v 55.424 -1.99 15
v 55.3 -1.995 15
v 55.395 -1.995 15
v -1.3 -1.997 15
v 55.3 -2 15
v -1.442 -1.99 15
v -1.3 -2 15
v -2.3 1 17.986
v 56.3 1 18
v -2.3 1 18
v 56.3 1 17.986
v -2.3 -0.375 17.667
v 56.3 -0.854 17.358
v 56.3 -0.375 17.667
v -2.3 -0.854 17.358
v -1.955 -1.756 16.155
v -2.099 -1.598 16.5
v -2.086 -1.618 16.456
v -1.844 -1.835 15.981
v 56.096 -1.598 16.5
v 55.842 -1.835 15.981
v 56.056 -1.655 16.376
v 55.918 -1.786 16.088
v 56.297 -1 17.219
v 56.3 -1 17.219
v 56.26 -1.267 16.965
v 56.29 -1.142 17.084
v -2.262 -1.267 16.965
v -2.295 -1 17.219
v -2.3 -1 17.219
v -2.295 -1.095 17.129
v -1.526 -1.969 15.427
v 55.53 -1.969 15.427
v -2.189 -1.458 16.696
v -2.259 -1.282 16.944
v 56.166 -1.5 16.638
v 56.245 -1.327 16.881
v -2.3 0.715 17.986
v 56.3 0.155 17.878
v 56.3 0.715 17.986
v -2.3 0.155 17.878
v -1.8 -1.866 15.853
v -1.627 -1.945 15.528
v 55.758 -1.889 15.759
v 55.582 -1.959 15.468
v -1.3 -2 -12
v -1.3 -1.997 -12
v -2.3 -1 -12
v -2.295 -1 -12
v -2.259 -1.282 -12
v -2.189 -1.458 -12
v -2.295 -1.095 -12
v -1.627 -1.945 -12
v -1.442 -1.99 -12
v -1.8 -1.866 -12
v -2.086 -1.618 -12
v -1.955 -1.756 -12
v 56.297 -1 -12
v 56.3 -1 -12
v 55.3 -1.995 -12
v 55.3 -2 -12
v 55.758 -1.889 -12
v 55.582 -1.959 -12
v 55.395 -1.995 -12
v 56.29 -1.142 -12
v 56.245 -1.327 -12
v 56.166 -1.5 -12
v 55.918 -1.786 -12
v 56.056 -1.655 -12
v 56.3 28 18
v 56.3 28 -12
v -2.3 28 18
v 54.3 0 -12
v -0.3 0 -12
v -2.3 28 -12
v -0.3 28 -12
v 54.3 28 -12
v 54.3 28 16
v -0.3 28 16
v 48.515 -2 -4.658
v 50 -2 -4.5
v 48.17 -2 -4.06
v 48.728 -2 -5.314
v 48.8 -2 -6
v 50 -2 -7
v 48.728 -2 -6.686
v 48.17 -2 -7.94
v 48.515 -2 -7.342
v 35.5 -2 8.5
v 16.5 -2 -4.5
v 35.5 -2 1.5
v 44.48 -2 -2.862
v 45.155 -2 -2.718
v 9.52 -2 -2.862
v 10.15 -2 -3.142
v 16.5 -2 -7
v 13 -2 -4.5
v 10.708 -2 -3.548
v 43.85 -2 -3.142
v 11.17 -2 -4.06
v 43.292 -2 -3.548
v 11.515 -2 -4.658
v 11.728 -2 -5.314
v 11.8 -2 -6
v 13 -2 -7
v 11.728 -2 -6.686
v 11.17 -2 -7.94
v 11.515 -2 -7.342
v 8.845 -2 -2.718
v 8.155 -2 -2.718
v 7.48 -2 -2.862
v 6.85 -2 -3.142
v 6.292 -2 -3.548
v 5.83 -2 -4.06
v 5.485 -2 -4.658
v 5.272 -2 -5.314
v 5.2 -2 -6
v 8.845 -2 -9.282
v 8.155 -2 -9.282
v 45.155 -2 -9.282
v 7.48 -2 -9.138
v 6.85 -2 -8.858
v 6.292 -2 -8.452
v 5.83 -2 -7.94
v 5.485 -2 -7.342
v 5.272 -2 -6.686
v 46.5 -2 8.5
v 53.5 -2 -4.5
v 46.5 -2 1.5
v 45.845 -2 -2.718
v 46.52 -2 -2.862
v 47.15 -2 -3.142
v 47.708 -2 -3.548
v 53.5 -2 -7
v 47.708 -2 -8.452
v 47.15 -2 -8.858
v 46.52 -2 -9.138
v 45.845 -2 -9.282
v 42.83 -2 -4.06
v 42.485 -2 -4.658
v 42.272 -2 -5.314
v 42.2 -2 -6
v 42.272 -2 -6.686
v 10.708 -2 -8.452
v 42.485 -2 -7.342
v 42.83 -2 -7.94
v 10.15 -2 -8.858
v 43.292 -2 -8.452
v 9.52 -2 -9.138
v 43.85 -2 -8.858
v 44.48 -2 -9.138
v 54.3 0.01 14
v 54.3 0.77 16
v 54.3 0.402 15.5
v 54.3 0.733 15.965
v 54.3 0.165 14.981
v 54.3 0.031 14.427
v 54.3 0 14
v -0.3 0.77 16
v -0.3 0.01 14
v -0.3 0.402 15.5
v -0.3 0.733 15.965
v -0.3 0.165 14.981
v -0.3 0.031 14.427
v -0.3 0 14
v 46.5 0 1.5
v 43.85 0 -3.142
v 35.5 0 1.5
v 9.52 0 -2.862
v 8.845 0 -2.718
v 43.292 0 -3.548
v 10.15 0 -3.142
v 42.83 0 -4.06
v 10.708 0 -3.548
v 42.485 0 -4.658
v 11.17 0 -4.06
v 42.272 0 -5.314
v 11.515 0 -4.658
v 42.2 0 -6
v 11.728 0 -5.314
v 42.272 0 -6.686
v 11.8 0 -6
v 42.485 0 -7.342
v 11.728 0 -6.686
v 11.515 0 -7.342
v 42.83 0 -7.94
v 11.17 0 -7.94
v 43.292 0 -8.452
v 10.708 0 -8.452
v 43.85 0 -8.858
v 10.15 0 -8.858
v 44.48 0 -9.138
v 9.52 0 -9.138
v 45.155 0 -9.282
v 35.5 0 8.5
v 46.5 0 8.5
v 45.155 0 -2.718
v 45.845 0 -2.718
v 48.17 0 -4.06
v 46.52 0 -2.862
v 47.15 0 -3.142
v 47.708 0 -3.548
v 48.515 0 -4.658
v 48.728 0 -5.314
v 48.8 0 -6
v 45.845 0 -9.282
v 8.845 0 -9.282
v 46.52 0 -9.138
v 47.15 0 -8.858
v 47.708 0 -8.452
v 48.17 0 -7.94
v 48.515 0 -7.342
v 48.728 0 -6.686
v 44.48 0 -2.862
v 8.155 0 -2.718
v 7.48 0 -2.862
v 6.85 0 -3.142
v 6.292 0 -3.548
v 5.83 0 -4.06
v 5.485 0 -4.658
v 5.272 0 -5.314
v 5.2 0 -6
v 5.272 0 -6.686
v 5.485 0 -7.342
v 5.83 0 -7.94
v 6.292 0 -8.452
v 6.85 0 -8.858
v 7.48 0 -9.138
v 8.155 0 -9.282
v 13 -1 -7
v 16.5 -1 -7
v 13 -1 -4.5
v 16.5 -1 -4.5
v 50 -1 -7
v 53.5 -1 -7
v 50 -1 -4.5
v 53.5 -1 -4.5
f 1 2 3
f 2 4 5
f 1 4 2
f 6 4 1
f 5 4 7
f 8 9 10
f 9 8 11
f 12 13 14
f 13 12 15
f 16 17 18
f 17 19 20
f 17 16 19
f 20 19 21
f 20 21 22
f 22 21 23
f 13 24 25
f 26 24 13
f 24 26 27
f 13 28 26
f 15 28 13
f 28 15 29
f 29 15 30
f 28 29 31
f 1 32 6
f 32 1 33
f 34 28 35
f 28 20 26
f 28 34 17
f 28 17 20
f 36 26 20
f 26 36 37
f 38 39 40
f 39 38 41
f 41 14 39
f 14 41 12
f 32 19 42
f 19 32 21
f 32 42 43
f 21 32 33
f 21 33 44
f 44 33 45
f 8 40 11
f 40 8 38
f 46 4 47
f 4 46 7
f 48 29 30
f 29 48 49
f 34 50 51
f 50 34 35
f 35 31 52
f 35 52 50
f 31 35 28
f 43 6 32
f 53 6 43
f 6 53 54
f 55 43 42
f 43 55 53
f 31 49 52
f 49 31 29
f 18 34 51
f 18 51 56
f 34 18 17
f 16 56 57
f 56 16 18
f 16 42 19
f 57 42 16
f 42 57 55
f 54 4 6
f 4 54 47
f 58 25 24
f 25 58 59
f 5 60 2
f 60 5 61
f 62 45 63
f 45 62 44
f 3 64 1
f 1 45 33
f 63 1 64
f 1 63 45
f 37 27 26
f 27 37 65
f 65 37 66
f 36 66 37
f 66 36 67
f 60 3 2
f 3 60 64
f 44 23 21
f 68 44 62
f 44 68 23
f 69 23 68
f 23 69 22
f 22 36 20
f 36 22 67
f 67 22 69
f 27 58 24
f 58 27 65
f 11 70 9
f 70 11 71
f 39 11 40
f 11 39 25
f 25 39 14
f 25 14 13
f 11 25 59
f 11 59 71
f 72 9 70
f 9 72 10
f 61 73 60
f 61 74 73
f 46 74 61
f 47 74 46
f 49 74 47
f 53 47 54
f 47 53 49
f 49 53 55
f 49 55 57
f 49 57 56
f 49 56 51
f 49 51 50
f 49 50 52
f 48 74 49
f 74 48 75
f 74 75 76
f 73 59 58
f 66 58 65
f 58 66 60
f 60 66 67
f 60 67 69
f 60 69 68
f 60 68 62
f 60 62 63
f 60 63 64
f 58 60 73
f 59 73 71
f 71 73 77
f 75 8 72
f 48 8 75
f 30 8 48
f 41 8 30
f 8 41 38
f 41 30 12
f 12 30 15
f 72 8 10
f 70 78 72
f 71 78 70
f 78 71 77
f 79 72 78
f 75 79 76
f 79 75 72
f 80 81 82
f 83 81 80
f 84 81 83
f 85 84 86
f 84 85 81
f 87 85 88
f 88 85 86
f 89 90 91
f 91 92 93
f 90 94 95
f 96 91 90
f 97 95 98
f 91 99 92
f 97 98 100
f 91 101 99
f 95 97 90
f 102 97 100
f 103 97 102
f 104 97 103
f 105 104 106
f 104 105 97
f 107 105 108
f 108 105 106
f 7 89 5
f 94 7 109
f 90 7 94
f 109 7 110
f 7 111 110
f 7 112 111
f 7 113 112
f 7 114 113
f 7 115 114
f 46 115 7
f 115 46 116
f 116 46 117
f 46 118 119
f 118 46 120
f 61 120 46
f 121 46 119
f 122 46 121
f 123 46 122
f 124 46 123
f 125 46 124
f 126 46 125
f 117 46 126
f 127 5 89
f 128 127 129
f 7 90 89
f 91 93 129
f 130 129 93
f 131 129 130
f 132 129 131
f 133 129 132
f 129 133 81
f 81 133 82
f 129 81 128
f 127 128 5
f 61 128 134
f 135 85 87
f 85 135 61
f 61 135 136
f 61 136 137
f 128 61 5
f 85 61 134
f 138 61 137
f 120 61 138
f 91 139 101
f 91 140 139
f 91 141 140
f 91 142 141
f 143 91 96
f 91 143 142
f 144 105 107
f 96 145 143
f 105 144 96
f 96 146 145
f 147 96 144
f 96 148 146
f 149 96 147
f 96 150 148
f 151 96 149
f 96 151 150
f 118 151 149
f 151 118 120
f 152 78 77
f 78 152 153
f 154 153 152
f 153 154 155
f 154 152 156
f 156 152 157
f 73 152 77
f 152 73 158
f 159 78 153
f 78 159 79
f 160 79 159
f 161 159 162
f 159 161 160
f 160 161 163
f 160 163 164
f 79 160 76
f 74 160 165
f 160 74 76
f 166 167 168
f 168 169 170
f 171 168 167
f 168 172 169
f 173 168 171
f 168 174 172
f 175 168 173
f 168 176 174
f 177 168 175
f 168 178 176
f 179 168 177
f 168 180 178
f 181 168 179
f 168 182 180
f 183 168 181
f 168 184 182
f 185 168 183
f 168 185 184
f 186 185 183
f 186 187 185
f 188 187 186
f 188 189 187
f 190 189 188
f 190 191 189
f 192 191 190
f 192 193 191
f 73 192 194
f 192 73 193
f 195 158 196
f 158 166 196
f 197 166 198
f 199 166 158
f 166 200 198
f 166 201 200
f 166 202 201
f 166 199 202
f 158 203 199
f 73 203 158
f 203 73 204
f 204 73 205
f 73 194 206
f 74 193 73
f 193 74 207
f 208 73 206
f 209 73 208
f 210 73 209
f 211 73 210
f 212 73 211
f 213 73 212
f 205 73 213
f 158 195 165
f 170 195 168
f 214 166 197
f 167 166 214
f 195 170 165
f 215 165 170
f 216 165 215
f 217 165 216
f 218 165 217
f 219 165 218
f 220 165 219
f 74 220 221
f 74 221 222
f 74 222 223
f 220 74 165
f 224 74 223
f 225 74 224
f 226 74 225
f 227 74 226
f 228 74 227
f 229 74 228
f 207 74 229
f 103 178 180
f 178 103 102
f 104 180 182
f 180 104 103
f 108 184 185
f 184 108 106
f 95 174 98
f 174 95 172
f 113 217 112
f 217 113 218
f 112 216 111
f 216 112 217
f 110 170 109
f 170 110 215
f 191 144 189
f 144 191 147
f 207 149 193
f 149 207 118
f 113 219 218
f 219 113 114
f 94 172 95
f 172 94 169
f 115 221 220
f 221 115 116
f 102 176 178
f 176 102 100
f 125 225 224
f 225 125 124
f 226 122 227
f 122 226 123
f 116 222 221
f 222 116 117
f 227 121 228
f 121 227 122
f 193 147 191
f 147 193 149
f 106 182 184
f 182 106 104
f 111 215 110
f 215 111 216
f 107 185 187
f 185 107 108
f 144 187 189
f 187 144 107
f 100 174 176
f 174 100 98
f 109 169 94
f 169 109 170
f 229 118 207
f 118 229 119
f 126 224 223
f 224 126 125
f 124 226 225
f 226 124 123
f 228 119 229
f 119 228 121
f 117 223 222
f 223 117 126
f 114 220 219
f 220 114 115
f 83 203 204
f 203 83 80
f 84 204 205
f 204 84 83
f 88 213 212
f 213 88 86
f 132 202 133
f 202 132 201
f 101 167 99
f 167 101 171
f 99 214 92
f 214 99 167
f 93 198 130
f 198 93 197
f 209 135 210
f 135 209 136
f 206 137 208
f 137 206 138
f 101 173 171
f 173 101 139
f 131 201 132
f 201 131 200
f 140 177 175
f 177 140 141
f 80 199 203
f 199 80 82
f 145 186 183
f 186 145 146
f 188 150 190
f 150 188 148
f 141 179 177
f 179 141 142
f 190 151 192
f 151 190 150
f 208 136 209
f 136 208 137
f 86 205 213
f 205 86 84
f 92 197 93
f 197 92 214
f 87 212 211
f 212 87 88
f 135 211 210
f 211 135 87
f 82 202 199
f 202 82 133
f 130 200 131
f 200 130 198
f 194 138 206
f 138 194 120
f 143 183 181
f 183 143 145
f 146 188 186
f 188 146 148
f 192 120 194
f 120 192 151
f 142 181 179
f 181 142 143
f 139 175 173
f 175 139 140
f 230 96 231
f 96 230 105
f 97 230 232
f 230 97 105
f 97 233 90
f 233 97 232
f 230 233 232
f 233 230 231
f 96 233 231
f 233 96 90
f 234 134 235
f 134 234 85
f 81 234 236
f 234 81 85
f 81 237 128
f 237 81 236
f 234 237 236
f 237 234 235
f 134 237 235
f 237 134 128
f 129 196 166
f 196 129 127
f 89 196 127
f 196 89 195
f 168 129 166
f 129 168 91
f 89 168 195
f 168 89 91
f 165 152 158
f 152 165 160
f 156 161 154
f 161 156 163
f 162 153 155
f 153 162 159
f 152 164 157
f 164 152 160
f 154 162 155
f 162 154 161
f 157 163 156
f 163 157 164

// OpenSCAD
// file: ../Parts/rounder.scad
// rounder.scad
// cutting tool for rounding off corners with a cylinder

//---------------------
module rounder(
r=10,   // radius
h=10,   // height
f=22,    // $fn
extra=0.01  // extra size for the cube
){

difference(){
  translate([-extra,-extra,-extra])
  cube([r+extra,r+extra,h+2*extra]);
  translate([r,r,-1])
  cylinder(r=r,h=h+2,$fn=f);
}

}

//---------------------------------------------------------------------------
module bevel(x=1,y=1,h=10){

linear_extrude(height=h)
polygon(points=[[0,0],[x,0],[0,y]]);
    
}
  

//========================

rounder();

//========================
// main file
//============================================================================================
// DancingBears.scad
//
// Update the globe chassis for the Dancing Bears Baldric
// Remove accelerometer, mic, level shifter.
//
// BB-8a, chassis for snowglobes
// this mods bb-7a by cutting it into two parts
// so can print without support.
//
// DrTomFlint, 19 April 2024
//=============================================================================================

tol=0.25;
extra=4;
use <../Parts/rounder.scad>

//------------------------------
module chassis1(){
    
difference(){   // cut the board and components out of 
    // the base plate #1
    union(){
        // Base 1 plate
        B1p=[ [0,1], [1,0], [53,0], [54,1], [54,79], [48,85], [6,85], [0,79] ];
        translate([0,0,0]) color("gray")
        linear_extrude(height=4.5)
        polygon(points=B1p);
        
        // Bottom side outer rail
        translate ([0,0,-11.5]) color("red") 
        difference(){
            linear_extrude(height=11.5,convexity=100) polygon(points=B1p);
            linear_extrude(height=15,convexity=100) offset(r=-2) polygon(points=B1p);
        }
        
        // Bottom side battery rail
        translate ([27,51.75,-4.5]) color("red") 
        difference(){
            linear_extrude(height=4.6,convexity=100) offset(r=1.0) square(size=[38,60.5],center=true);
            #linear_extrude(height=10,convexity=100,scale=0.9) square(size=[38,60.5],center=true);
            // cut for cable outlet
            translate([0,-27,0])
            linear_extrude(height=10) square(size=[26,12],center=true);
        }
        // mirror image to enclose battery
        translate ([27,51.75,-4]) color("cyan") 
        rotate([0,180,0])
        difference(){
            linear_extrude(height=4,convexity=100) offset(r=1.0) square(size=[38,60.5],center=true);
            linear_extrude(height=10,convexity=100,scale=0.9) square(size=[38,60.5],center=true);
            // cut for cable outlet
            translate([0,-27,0])
            linear_extrude(height=10,convexity=100) square(size=[26,12],center=true);
        }
        
        // ribs to support top end battery rail
        translate([49,55,-6.0]) color("pink")
        linear_extrude(height=6.0) square(size=[6,3],center=true);
        translate([49,77,-6.0]) color("pink")
        linear_extrude(height=6.0) square(size=[6,3],center=true);

        translate([5,55,-6.0]) color("pink")
        linear_extrude(height=6.0) square(size=[6,3],center=true);
        translate([5,77,-6.0]) color("pink")
        linear_extrude(height=6.0) square(size=[6,3],center=true);
        
    } // end of boss union
    
// NEW holes at the top to help attach the two 
// parts using some glue and fibers
    color("cyan")
    translate([6,81,0]) 
    cylinder(h=20,r=1,center=true,$fn=20);
    color("cyan")
    translate([47.5,81,0]) 
    cylinder(h=20,r=1,center=true,$fn=20);
    color("cyan")
    translate([24.75,4,0]) 
    cylinder(h=20,r=1,center=true,$fn=20);

    
// Adafruit PowerBoost 1000c
translate([29.1,1,1.5]) color("blue"){
    difference(){
        linear_extrude(height=10) 
        offset(r=tol) square(size=[22.9, 36.3]);

        linear_extrude(height=1) 
        offset(r=-3) square(size=[22.9, 36.3]);
    }
    translate([11.45,26,0]) color("cyan") {
    cylinder(h=4,r=5,center=true,$fn=20);
    }
}

// notch for the USB charger cable
translate([35,0,3]) color("pink"){
    linear_extrude(height=10) 
        offset(r=tol) square(size=[12, 3]);
}

// Pro Mini
translate([2,1,1.5]) color("red"){
    difference(){
        linear_extrude(height=10) 
        offset(r=tol) square(size=[18.4, 33.7]);

        difference(){
        linear_extrude(height=1.5) 
        offset(r=-3) square(size=[18.4, 33.7]);

        linear_extrude(height=1.5) 
        translate([2.8,7,0]) square(size=[6,20]);
        }

    }
    translate([12,26,-2]) color("cyan") {
    cylinder(h=12,r=4,$fn=30,center=true);
    }
}

// Xbee
translate([7,55,1.5]) color("yellow") {
  pxb=[ [0,0], [24.4,0], [24.4,21], [16.9,27.7], [7.5,27.7], [0,22] ];
  linear_extrude(height=10) 
  offset(r=tol) polygon(points=pxb);

  // alternative stowage for antenna
  translate([6,20,-2]) color("black") {
      linear_extrude(height=9) 
      offset(r=1, $fn=30) square(size=[30,2]);
  }    
  // popout
  translate([5,6,-2]) color("black") {
      linear_extrude(height=9) 
      offset(r=1, $fn=30) square(size=[14,9]);
  }    
}

// Switch 1
translate([2,1.6,-11]) color("blue"){
  union(){
    // switch body including solder lug clearance
    linear_extrude(height=12) 
    offset(r=tol)
     square(size=[13, 15]);
    
    translate([6.5,0,5]) rotate([90,0,0]) cylinder(r=3.3,h=10,$fn=30);
  }
}
// Switch 2
translate([54-15,1.6,-11]) color("blue"){
  union(){
    // switch body including solder lug clearance
    linear_extrude(height=12) 
    offset(r=tol)
     square(size=[13, 15]);
    
    translate([6.5,0,5]) rotate([90,0,0]) cylinder(r=3.3,h=10,$fn=30);
  }
}

// anti rotate slot for switches
translate([13,0,-7]) color("blue"){
        linear_extrude(height=2.5) 
         square(size=[3.5, 1.0]);
}
translate([50,0,-7]) color("pink"){
        linear_extrude(height=2.5) 
         square(size=[3.5, 1.0]);
}

// Thru hole for wiring lower right
    translate([49.5,46,-6]) color("black") {
        linear_extrude(height=12) 
        offset(r=1,$fn=8) square(size=[3.25,11],center=true);
    }
// Thru hole for wiring upper right
    translate([49.5,64,-6]) color("black") {
        linear_extrude(height=12) 
        offset(r=1,$fn=8) square(size=[3.25,11],center=true);
    }
// Thru hole for wiring lower left
    translate([2.75,41,-6]) color("black") {
        linear_extrude(height=12) 
        offset(r=1,$fn=8) square(size=[3.25,10]);
    }
// Thru hole for wiring upper left
    translate([2.75,58,-6]) color("black") {
        linear_extrude(height=12) 
        offset(r=1,$fn=8) square(size=[3.25,16]);
    }

} // end of diffence  =================================

// add text for Version
  translate ([40,47.5,3.5]) color("red") 
  linear_extrude(height=1.5)
  text("V1", font = "Open Sans:style=Bold", size=6,halign="center",valign="center",spacing=1.1);
  translate ([20,50,3.5]) color("red") 
  linear_extrude(height=1.5)
  text("Dancing", font = "Open Sans:style=Bold", size=4,halign="center",valign="center",spacing=1.1);
  translate ([22,45,3.5]) color("red") 
  linear_extrude(height=1.5)
  text("Bears", font = "Open Sans:style=Bold", size=4,halign="center",valign="center",spacing=1.1);

    
// retainer tabs ----------------------------------
pt1=[ [0,0], [0.5,0.5], [0.5,0.75], [0,1], [-1.0,1], [-1.0,0] ];

// PS1000c blue
translate([29.1,6,4]) color("orange") {
    rotate([90,0,0]) linear_extrude(height=4) polygon(points=pt1);
}
translate([52,2,4]) color("orange") {
    rotate([90,0,180]) linear_extrude(height=4) polygon(points=pt1);
}
translate([40.5,37.25,4]) color("orange") {
    rotate([90,0,-90]) linear_extrude(height=4) polygon(points=pt1);
}

// Arduino Pro Mini red
translate([2,6,4]) color("orange") {
    rotate([90,0,0]) linear_extrude(height=4) polygon(points=pt1);
}
translate([17.2,34.8,4]) color("orange") {
    rotate([90,0,-90]) linear_extrude(height=4) polygon(points=pt1);
}
translate([9.2,34.8,4]) color("orange") {
    rotate([90,0,-90]) linear_extrude(height=4) polygon(points=pt1);
}
translate([20.5,2,4]) color("orange") {
    rotate([90,0,180]) linear_extrude(height=4) polygon(points=pt1);
}
    
// Level Shift green
//~ translate([38,54,4]) color("orange") {
    //~ rotate([90,0,90]) linear_extrude(height=4) polygon(points=pt1);
//~ }
//~ translate([42,72.5,4]) color("orange") {
    //~ rotate([90,0,-90]) linear_extrude(height=4) polygon(points=pt1);
//~ }

// Accel LIS3DH yellow
//~ translate([31,43,4]) color("pink") {
    //~ rotate([90,0,180]) linear_extrude(height=4) polygon(points=pt1);
//~ }
//~ translate([7.5,38.9,4]) color("orange") {
    //~ rotate([90,0,90]) linear_extrude(height=4) polygon(points=pt1);
//~ }
//~ translate([11.5,52.6,4]) color("orange") {
    //~ rotate([90,0,-90]) linear_extrude(height=4) polygon(points=pt1);
//~ }


// Xbee
translate([21,82.75,3.5]) color("orange") {
    rotate([90,0,-90]) linear_extrude(height=4) polygon(points=pt1);
}
translate([7,55,4.4]) color("orange") {
    rotate([90,0,90]) linear_extrude(height=4) polygon(points=pt1);
}
translate([24,55,4.4]) color("orange") {
    rotate([90,0,90]) linear_extrude(height=4) polygon(points=pt1);
}

    
} // end of module chassis1()

//----------------------------------------------------------------------
module endCap(){

color("orange")
difference(){
  translate([-2.3,-2,-12]) 
  cube([58.6,30,30]);
  translate([-0.3,0,-12-2]) 
  cube([54.6,30,30]);
  translate([-2.3,-2,18]) 
  rotate([0,90,0])
  rounder(r=3,h=58.6,f=33);

  // Switch 1
  translate([2,1.6,-11])
  translate([6.5,0,5]) rotate([90,0,0]) cylinder(r=3.3,h=10,$fn=30);
  // Switch 2
  translate([54-15,1.6,-11])
  translate([6.5,0,5]) rotate([90,0,0]) cylinder(r=3.3,h=10,$fn=30);
  
  // anti rotate slot for switches
  translate([13,-2,-7]) color("blue"){
          linear_extrude(height=2.5) 
           square(size=[3.5, 1.0]);
  }
  translate([50,-2,-7]) color("pink"){
          linear_extrude(height=2.5) 
           square(size=[3.5, 1.0]);
  }
  
  // cut for the charger port
  translate([41,-4,5])
  cube([11,20,7],center=true);

  translate([-2.3,-2,-13]) 
  rotate([0,0,0])
  rounder(r=1,h=34,f=33);

  translate([-2.3+58.6,-2,-13]) 
  rotate([0,0,90])
  rounder(r=1,h=34,f=33);
}

  translate([-2,0,19-2]) 
  rotate([0,90,0])
  rounder(r=3,h=58,f=33);




}

//===========================================

//~ chassis1();

endCap();

//  cutting box, CHOOSE EITHER INTER OR DIFF
// TODO check the clearance between the 2 parts
// leaves enough material in the right places
// probably look at slicer to be sure

// bottom side
if(0){
difference(){
    
    chassis1();

    color("pink")
    translate([-4,-4,1-0.2])
    cube([80,100,20]);

}
}


//translate([0,0,40])
// top side
if(0){
intersection(){
    
    chassis1();

    color("pink")
    translate([-4,-4,1])
    cube([80,100,20]);

}
}
//===========================================
